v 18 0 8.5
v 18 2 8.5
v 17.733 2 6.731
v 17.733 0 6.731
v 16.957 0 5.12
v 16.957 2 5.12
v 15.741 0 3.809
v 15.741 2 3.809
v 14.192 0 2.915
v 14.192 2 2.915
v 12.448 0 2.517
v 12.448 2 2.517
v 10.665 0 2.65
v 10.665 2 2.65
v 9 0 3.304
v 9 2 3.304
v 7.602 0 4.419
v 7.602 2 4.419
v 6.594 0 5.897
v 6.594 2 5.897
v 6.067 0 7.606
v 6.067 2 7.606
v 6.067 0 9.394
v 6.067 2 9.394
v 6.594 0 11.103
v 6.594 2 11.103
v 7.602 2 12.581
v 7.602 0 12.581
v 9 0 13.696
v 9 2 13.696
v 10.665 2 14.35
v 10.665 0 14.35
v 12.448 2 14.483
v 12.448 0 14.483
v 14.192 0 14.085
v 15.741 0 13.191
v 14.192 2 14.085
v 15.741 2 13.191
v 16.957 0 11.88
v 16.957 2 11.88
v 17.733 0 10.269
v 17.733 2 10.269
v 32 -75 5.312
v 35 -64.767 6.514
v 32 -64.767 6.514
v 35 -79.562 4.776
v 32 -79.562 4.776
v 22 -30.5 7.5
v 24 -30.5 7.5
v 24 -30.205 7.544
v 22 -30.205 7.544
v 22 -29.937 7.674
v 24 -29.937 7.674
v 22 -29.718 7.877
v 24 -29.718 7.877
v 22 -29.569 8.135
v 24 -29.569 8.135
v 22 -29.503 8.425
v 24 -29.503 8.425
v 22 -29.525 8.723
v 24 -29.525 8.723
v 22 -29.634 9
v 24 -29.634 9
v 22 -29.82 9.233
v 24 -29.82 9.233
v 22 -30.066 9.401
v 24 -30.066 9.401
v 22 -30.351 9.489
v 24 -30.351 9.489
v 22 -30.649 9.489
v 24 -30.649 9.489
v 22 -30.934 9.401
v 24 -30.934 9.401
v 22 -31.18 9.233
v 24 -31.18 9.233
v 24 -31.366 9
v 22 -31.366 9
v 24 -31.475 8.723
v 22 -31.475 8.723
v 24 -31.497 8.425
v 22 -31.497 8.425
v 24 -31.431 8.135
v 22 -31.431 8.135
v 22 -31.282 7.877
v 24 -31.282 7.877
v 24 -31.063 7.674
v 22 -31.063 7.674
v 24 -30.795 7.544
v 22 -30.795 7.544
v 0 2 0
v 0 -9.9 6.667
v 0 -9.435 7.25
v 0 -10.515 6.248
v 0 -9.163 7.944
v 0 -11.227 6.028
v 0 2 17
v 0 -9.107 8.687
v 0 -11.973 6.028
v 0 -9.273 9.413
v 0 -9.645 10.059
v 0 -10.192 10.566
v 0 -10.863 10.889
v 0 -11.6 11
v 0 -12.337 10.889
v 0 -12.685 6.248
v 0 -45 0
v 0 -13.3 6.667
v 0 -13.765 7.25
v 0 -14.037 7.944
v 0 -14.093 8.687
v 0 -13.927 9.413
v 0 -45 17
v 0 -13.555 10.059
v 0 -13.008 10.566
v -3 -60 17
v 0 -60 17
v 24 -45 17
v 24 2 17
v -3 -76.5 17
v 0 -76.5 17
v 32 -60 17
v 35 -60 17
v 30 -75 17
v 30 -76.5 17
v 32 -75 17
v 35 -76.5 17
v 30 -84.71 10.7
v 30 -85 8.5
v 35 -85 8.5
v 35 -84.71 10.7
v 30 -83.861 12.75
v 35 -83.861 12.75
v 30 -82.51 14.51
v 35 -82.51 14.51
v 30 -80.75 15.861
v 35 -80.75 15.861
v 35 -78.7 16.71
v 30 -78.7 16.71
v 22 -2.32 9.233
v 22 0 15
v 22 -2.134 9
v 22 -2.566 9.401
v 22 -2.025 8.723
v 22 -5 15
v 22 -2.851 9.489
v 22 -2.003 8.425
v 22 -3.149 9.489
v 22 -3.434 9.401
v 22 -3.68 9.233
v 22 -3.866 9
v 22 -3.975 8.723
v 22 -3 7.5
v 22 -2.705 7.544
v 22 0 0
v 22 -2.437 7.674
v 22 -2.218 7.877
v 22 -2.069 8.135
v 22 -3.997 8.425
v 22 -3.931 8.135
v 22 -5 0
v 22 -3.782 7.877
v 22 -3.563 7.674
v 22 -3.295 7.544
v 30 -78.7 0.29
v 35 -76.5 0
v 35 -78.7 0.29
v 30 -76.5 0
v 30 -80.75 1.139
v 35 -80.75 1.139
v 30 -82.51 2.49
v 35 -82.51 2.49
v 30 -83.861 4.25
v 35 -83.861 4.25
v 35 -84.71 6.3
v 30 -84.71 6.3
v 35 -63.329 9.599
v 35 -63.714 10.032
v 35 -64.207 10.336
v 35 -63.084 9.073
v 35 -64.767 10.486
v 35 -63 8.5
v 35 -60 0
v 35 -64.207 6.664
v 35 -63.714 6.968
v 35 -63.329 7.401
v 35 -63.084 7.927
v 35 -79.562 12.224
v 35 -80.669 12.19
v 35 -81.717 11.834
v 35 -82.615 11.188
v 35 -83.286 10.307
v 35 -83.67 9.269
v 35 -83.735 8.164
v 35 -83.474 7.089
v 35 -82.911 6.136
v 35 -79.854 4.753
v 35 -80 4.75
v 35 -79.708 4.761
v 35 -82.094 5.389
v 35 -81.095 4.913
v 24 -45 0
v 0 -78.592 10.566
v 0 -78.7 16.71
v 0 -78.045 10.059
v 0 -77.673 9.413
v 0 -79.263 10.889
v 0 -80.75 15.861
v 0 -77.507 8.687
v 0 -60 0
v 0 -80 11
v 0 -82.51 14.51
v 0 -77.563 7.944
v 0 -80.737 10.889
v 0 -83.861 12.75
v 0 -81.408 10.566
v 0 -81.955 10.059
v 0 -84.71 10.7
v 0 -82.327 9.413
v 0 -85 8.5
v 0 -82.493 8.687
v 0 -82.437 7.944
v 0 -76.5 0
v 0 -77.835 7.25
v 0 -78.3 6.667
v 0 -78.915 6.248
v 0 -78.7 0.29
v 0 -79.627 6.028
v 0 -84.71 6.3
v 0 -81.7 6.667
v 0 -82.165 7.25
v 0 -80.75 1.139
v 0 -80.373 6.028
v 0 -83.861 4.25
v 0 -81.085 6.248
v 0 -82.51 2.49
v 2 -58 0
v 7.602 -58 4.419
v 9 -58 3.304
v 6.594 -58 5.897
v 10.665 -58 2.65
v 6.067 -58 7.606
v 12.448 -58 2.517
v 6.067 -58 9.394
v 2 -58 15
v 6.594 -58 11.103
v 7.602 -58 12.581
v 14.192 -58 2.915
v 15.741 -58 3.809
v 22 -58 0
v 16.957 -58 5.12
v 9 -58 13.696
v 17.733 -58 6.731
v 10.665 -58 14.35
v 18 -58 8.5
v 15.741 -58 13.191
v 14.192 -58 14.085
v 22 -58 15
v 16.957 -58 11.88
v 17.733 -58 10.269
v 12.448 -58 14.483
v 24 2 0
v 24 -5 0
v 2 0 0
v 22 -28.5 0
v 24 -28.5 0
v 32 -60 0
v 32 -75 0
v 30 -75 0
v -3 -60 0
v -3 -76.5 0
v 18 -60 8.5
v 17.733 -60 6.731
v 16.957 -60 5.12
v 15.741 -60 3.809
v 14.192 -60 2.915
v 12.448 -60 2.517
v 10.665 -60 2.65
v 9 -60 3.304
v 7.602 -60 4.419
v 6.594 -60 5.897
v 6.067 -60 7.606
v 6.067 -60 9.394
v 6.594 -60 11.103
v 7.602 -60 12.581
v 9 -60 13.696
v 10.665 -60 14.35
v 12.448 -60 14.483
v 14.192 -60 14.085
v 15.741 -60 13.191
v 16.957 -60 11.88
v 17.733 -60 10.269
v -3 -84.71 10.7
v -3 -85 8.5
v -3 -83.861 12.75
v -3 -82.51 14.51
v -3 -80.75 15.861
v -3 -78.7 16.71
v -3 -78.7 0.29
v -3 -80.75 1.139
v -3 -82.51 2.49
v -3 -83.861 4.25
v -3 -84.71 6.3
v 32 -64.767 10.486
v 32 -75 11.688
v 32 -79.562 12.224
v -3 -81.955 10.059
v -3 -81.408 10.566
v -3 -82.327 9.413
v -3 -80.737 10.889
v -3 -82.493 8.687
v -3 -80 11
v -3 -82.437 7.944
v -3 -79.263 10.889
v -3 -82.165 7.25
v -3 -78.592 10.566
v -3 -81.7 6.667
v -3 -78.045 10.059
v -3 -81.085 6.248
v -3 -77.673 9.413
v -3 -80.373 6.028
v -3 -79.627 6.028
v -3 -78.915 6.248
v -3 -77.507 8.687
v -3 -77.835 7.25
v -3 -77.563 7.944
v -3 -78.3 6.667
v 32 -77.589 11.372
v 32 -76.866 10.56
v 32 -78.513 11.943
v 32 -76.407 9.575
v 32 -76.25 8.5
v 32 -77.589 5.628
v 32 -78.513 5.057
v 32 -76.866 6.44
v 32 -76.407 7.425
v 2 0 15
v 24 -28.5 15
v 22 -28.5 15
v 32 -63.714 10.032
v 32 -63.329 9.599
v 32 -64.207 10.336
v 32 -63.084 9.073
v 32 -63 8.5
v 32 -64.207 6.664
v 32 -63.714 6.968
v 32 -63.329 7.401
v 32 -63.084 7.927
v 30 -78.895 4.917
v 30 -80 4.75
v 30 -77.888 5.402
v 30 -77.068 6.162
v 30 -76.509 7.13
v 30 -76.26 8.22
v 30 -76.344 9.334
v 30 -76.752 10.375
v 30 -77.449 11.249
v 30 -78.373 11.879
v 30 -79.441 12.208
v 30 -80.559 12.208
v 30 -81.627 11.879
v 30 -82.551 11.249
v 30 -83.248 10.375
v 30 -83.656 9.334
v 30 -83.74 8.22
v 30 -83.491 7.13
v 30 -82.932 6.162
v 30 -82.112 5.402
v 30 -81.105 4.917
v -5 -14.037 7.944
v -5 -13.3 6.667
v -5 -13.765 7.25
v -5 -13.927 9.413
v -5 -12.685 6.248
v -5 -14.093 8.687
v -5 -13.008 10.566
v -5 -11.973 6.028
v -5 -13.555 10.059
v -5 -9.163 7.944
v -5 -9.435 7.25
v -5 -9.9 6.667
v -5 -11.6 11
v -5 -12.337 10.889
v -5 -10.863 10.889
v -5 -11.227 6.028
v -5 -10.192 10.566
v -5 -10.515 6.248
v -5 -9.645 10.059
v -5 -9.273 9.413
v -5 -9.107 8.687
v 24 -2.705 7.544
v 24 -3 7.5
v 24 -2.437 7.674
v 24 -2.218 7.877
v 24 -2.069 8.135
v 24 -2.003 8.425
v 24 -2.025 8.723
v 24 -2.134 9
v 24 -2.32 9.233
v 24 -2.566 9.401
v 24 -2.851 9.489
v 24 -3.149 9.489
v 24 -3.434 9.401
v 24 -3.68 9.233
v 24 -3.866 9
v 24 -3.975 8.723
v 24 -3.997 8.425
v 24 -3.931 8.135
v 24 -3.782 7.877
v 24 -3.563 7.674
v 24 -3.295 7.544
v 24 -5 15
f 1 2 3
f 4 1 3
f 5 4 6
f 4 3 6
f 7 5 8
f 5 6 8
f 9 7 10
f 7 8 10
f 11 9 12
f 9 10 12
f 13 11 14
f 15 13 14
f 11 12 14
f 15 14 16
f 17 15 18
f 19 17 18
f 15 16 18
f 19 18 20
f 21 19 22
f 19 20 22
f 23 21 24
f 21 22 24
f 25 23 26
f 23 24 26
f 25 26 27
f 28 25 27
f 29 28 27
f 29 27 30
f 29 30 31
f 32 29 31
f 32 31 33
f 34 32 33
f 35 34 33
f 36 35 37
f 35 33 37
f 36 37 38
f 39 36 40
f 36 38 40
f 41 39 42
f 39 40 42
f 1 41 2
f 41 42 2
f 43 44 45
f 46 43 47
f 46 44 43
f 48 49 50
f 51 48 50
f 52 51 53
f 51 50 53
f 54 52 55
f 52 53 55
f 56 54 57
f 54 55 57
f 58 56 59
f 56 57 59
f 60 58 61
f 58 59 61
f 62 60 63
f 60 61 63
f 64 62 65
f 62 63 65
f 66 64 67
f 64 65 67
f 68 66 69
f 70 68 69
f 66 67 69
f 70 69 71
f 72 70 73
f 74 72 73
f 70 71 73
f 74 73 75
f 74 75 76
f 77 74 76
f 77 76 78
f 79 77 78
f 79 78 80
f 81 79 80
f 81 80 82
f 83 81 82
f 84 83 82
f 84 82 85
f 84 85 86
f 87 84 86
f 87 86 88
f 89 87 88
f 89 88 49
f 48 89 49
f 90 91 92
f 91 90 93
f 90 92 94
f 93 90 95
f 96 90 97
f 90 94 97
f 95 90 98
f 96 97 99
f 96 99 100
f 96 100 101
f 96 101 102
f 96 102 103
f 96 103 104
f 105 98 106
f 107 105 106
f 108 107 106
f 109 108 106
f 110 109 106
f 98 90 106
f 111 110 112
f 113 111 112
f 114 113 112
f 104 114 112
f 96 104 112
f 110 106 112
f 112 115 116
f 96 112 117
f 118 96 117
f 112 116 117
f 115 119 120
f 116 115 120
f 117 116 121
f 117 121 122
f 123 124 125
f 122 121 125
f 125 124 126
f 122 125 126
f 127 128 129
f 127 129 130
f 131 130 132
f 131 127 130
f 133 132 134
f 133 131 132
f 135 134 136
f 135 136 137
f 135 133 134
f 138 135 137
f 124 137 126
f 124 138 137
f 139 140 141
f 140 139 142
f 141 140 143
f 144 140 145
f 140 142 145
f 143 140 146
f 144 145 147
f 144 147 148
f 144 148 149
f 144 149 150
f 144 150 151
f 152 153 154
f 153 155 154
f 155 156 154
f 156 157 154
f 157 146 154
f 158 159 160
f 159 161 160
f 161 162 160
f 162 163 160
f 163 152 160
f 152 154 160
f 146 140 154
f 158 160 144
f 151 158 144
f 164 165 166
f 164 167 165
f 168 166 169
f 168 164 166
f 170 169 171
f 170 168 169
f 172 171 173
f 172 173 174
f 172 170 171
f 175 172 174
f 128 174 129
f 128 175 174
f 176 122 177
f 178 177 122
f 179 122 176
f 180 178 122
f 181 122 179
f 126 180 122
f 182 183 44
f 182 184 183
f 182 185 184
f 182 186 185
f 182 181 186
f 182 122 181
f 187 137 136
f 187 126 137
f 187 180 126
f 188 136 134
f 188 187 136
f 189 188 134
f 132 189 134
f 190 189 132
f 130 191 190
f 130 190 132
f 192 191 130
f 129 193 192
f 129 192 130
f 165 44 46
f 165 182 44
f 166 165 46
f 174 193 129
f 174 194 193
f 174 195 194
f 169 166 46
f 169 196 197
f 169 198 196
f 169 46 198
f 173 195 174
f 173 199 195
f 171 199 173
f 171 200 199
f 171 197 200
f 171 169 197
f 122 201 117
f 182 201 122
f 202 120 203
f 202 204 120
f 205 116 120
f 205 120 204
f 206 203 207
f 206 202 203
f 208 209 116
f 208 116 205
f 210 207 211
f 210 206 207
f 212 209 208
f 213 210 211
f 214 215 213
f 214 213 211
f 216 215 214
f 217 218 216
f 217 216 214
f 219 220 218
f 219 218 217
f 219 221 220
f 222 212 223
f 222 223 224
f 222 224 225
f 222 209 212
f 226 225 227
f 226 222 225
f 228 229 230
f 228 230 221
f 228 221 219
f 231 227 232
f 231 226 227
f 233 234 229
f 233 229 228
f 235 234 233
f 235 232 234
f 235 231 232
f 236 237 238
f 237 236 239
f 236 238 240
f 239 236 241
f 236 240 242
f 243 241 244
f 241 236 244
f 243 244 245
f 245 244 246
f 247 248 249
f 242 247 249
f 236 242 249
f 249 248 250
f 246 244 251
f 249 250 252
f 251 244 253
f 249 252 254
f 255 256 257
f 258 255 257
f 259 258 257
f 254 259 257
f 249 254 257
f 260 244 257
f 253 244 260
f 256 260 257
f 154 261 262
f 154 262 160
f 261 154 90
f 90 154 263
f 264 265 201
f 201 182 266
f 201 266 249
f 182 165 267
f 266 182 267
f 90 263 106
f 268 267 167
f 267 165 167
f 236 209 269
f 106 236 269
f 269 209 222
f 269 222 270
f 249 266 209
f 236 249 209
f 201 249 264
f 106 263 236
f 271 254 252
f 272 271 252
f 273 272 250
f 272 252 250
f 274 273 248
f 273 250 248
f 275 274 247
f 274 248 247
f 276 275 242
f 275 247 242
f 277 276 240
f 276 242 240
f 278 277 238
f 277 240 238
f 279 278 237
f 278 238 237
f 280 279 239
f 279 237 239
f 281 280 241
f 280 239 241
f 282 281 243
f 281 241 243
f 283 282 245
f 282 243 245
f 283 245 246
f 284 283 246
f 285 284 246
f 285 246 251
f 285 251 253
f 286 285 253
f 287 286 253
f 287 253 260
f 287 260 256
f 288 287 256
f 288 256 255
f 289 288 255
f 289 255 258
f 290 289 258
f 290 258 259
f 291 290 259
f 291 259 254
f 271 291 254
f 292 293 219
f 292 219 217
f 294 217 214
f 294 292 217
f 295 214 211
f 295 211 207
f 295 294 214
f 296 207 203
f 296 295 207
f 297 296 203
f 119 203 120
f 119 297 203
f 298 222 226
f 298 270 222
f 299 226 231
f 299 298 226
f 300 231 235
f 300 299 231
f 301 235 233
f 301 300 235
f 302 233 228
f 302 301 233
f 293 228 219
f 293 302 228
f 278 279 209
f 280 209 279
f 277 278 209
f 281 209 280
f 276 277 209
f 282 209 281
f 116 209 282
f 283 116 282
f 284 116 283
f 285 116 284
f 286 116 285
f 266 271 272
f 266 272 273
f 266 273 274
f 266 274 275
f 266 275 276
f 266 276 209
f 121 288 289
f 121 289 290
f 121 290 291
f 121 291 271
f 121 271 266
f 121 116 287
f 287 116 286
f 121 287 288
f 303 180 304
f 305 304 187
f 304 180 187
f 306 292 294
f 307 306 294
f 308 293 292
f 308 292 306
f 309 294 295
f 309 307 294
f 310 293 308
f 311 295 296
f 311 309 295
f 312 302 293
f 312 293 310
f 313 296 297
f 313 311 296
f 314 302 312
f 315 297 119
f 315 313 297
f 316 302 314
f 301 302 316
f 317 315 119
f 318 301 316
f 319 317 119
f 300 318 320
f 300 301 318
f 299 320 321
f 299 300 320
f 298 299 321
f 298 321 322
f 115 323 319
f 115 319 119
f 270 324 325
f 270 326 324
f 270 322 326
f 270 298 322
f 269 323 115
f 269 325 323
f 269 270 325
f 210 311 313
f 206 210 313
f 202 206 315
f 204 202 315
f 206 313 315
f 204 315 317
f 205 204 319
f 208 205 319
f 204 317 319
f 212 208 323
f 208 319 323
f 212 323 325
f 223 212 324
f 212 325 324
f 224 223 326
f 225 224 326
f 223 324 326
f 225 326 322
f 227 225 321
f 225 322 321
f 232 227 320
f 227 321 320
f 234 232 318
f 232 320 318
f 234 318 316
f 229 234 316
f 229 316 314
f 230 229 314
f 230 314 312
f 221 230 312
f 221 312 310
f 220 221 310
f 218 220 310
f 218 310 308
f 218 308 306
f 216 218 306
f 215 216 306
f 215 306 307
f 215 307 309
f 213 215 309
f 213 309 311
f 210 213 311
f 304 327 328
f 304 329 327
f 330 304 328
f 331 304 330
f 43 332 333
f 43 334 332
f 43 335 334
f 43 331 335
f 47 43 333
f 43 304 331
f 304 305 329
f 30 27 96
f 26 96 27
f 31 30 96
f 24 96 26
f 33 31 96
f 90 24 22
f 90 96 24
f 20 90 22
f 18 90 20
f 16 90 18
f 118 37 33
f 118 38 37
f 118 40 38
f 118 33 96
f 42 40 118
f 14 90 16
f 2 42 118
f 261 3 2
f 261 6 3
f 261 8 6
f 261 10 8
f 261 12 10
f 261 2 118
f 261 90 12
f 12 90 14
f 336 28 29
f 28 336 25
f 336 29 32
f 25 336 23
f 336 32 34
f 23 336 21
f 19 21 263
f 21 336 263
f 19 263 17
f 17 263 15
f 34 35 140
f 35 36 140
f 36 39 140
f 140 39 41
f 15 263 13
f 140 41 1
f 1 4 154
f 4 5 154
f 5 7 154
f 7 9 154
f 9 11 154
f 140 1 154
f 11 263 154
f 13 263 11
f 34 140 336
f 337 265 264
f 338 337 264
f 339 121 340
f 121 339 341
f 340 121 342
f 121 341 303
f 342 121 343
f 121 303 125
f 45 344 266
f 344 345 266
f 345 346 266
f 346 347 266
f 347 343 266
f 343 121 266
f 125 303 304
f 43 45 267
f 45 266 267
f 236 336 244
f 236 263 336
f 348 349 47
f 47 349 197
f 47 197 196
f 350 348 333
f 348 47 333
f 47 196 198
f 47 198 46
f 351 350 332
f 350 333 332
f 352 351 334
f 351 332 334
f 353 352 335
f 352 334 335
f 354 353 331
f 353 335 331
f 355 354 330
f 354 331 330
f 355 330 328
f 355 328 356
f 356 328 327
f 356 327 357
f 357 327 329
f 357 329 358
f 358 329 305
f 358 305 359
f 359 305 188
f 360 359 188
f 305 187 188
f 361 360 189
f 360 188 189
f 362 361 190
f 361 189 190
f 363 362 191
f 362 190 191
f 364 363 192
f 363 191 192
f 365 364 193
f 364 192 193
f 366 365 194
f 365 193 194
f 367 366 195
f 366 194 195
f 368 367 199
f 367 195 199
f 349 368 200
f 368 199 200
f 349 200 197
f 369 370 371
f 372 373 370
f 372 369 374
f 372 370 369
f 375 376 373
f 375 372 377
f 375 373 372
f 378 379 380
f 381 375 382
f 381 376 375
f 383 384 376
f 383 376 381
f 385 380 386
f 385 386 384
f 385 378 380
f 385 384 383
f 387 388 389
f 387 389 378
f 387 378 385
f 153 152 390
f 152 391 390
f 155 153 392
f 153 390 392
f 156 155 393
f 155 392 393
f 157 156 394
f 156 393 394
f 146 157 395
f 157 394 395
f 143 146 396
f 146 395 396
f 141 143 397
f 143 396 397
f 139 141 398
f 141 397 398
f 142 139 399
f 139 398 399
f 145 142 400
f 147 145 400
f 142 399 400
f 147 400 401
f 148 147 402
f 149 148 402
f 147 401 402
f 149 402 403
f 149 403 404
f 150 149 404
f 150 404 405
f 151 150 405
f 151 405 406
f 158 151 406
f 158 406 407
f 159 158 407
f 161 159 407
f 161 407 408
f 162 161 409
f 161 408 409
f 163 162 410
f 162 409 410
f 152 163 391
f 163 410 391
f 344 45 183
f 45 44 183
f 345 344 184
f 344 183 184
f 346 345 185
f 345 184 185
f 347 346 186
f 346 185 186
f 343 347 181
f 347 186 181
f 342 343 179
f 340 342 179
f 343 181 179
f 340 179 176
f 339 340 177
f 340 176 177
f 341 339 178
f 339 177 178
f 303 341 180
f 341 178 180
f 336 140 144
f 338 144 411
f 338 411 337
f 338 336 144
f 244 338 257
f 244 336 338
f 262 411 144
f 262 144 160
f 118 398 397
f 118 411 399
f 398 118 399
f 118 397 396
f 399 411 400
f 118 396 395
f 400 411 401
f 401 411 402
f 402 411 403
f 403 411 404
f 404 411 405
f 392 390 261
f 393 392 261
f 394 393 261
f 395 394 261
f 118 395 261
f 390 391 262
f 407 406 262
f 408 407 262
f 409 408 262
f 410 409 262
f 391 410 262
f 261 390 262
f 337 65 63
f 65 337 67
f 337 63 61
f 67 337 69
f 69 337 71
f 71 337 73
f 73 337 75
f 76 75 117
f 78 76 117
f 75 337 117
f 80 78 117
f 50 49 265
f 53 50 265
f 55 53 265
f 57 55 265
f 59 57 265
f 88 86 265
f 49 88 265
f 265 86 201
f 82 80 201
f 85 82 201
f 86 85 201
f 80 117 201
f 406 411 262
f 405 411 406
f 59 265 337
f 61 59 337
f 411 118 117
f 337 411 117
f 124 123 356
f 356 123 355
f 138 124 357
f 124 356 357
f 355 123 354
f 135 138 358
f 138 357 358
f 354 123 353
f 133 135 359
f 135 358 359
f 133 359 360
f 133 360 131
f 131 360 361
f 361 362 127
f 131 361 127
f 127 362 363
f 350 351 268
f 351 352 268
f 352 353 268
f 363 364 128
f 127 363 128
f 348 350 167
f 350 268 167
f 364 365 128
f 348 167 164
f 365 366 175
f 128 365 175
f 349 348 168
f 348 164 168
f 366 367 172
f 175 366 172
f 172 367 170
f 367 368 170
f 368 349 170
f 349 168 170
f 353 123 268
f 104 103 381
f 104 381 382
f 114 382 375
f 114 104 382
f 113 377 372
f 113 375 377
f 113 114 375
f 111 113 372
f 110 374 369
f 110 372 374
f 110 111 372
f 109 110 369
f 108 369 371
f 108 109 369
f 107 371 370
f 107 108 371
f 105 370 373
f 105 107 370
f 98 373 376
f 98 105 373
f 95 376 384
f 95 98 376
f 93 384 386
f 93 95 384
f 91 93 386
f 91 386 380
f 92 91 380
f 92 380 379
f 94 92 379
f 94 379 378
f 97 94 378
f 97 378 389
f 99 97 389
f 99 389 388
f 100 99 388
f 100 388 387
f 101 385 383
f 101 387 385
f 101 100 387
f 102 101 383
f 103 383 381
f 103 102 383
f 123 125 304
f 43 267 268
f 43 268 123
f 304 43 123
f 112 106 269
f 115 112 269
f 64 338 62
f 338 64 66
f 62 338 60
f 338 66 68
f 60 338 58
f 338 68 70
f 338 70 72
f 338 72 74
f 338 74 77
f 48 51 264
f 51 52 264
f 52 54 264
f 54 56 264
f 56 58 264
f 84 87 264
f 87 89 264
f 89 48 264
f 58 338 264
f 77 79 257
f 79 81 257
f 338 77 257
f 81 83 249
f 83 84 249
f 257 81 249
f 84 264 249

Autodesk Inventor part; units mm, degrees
ref_plane "YZ Plane" through (0, 0, 0) normal (1, 0, 0) x (0, 1, 0)
ref_plane "XZ Plane" through (0, 0, 0) normal (0, 1, 0) x (-1, 0, 0)
ref_plane "XY Plane" through (0, 0, 0) normal (0, 0, 1) x (1, 0, 0)
sketch "Sketch1" plane through (0, 0, 0) normal (0, 0, 1) x (1, 0, 0)
  line L0 (0, 0) -> (24, 0)
  line L1 (24, 0) -> (24, -60)
  line L2 (24, -60) -> (0, -60)
  line L3 (0, -60) -> (0, 0)
  dimension "d0" = 24
  dimension "d1" = 60
extrude "Extrusion1" add sketch "Sketch1" along normal blind 2
sketch "Sketch2" plane through (0, 0, 2) normal (0, 0, 1) x (1, 0, 0)
  line L0 (0, -60) -> (24, -60) projected
  line L1 (0, 0) -> (2, 0)
  line L2 (2, 0) -> (2, -60)
  line L3 (2, -60) -> (0, -60)
  line L4 (0, -60) -> (0, 0)
  line L5 (24, -60) -> (24, 0) projected
  line L6 (24, 0) -> (22, 0)
  line L7 (22, 0) -> (22, -60)
  line L8 (22, -60) -> (24, -60)
  line L9 (24, -60) -> (24, 0)
  dimension "d4" = 2
  dimension "d5" = 2
extrude "Extrusion2" add sketch "Sketch2" along normal blind 15
sketch "Sketch3" plane through (24, -60, 0) normal (1, 0, 0) x (0, 0, -1)
  circle A0 centre (-8.5, 57) radius 1
  circle A1 centre (-8.5, 29.5) radius 1
  line L0 (-17, 0) -> (-17, 60) projected
  line L1 (0, 60) -> (-17, 60) projected
  dimension "d8" = 2
  dimension "d9" = 2
  dimension "d10" = 8.5
  dimension "d11" = 8.5
  dimension "d12" = 27.5
  dimension "d13" = 3
extrude "Extrusion3" cut sketch "Sketch3" against normal up to surface (2 mm away)
sketch "Sketch4" plane through (24, -60, 0) normal (1, 0, 0) x (0, 0, -1)
  line L0 (-17, 60) -> (-17, 0) projected
  line L1 (-17, 55) -> (-2, 55)
  line L2 (-2, 55) -> (-2, 31.5)
  line L3 (-2, 31.5) -> (-17, 31.5)
  line L4 (-17, 31.5) -> (-17, 55)
  circle A0 centre (-8.5, 57) radius 1 projected
  circle A1 centre (-8.5, 29.5) radius 1 projected
  point P0 (-17, 31.5)
  dimension "d23" = 15
  dimension "d24" = 23.5
  dimension "d25" = 2
  dimension "d26" = 2
extrude "Extrusion4" cut sketch "Sketch4" against normal up to surface (2 mm away) contours L1 L2 L3 L0
sketch "Sketch5" plane through (0, -60, 0) normal (-1, 0, 0) x (0, 0, 1)
  circle A0 centre (8.5, 48.4) radius 2.5
  circle A1 centre (8.5, 57) radius 1 projected
  point P0 (0, 60)
  dimension "d29" = 5
  dimension "d32" = 8.6
  dimension "d33" = 0
extrude "Extrusion5" add sketch "Sketch5" along normal blind 5 contours A0
sketch "Sketch12" plane through (0, 0, 0) normal (0, 0, -1) x (-1, 0, 0)
  line L0 (3, -60) -> (-35, -60)
  line L1 (-35, -60) -> (-35, -85)
  line L2 (-35, -85) -> (3, -85)
  line L3 (3, -85) -> (3, -60)
  line L4 (0, 0) -> (0, -60) projected
  line L5 (-2, -60) -> (-22, -60) projected
  line L6 (3, -60) -> (0, -60)
  line L7 (0, -60) -> (0, -85)
  line L8 (0, -85) -> (3, -85)
  line L9 (3, -85) -> (3, -60)
  line L10 (-35, -60) -> (-30, -60)
  line L11 (-30, -60) -> (-30, -85)
  line L12 (-30, -85) -> (-35, -85)
  line L13 (-35, -85) -> (-35, -60)
  line L14 (-30, -60) -> (-32, -60)
  line L15 (-32, -60) -> (-32, -75)
  line L16 (-32, -75) -> (-30, -75)
  line L17 (-30, -75) -> (-30, -60)
  dimension "d51" = 38
  dimension "d52" = 3
  dimension "d53" = 25
  dimension "d54" = 0
  dimension "d55" = 3
  dimension "d56" = 5
  dimension "d95" = 2
  dimension "d96" = 15
extrude "Extrusion9" add sketch "Sketch12" against normal up to surface (17 mm away) contours L3 L2 L7 L0 | L2 L1 L0 L15 L16 L11
sketch "Sketch13" plane through (0, 0, 0) normal (0, 0, -1) x (-1, 0, 0)
  line L0 (-32, -60) -> (-35, -60) projected
  line L1 (0, -60) -> (-24, -60) projected
  line L2 (-35, -60) -> (-24, -60)
  line L3 (-24, -60) -> (-24, -45)
  line L4 (-24, -45) -> (-35, -60)
  line L5 (0, -60) -> (0, -45)
  line L6 (0, 0) -> (0, -60) projected
  line L7 (0, -60) -> (15, -60) construction
  line L8 (0, -45) -> (3, -60)
  line L9 (3, -60) -> (0, -60)
  point P0 (-30, -60)
  dimension "d59" = 15
  dimension "d60" = 90
  dimension "d63" = 15
  dimension "d64" = 90
extrude "Extrusion10" add sketch "Sketch13" against normal up to surface (17 mm away)
sketch "Sketch14" plane through (-3, -85, 0) normal (-1, 0, 0) x (0, 0, 1)
  circle A0 centre (8.5, 5) radius 2.5
  line L0 (17, 0) -> (17, 25) projected
  line L1 (0, 25) -> (17, 25) projected
  point P0 (0, 85)
  dimension "d65" = 5
  dimension "d66" = 8.5
  dimension "d67" = 20
extrude "Extrusion11" cut sketch "Sketch14" against normal up to surface (38 mm away)
sketch "Sketch15" plane through (2, -60, 2) normal (1, 0, 0) x (0, 0, -1)
  line L0 (2, 0) -> (-15, 0) projected
  line L1 (-15, 60) -> (-13, 60)
  line L2 (-13, 60) -> (-13, 0)
  line L3 (-13, 0) -> (-15, 0)
  line L4 (-15, 0) -> (-15, 60)
  point P0 (2, 60)
  dimension "d70" = 2
extrude "Extrusion12" add sketch "Sketch15" along normal up to surface (22 mm away)
sketch "Sketch16" plane through (0, 0, 0) normal (0, 0, -1) x (-1, 0, 0)
  line L0 (-2, 0) -> (-2, -60) projected
  line L1 (-2, -60) -> (-22, -60) projected
  line L2 (-2, 0) -> (-22, 0)
  line L3 (-22, 0) -> (-22, -60)
  line L4 (-22, -60) -> (-2, -60)
  line L5 (-2, -60) -> (-2, 0)
  line L6 (-24, -45) -> (-24, 0) projected
  line L7 (-24, -28.5) -> (-22, -28.5) projected
  line L8 (-24, -5) -> (-22, -5)
  line L9 (-22, -5) -> (-22, -28.5)
  line L10 (-22, -28.5) -> (-24, -28.5)
  line L11 (-24, -28.5) -> (-24, -5)
  point P0 (0, 0)
extrude "Extrusion14" cut sketch "Sketch16" against normal up to surface (2 mm away)
sketch "Sketch17" plane through (22, -60, 0) normal (0, -1, 0) x (1, 0, 0)
  line L0 (-20, 2) -> (-20, 15) projected
  line L1 (-20, 15) -> (0, 15) projected
  line L2 (-20, 0) -> (0, 0)
  line L3 (0, 0) -> (0, 15)
  line L4 (0, 15) -> (-20, 15)
  line L5 (-20, 15) -> (-20, 0)
  point P0 (-22, 0)
  point P1 (-20, 2)
extrude "Extrusion15" add sketch "Sketch17" against normal blind 2
sketch "Sketch18" plane through (0, 0, 0) normal (0, 1, 0) x (1, 0, 0)
  line L0 (0, 0) -> (0, -17) projected
  line L1 (24, -17) -> (24, 0) projected
  line L2 (0, -17) -> (24, -17)
  line L3 (24, -17) -> (24, 0)
  line L4 (24, 0) -> (0, 0)
  line L5 (0, 0) -> (0, -17)
extrude "Extrusion16" add sketch "Sketch18" along normal blind 2
sketch "Sketch19" plane through (0, 2, 0) normal (0, 1, 0) x (1, 0, 0)
  circle A0 centre (12, -8.5) radius 6
  line L0 (0, 0) -> (0, -17) projected
  line L1 (0, -17) -> (24, -17) projected
  dimension "d81" = 12
  dimension "d82" = 12
  dimension "d83" = 8.5
extrude "Extrusion17" cut sketch "Sketch19" against normal up to surface (62 mm away)
sketch "Sketch20" plane through (35, -85, 17) normal (1, 0, 0) x (0, 0, -1)
  circle A0 centre (8.5, 5) radius 2.5 projected
  circle A1 centre (8.5, 5) radius 3.75
  point P0 (17, 85)
  dimension "d86" = 7.5
extrude "Extrusion18" cut sketch "Sketch20" against normal up to surface (5 mm away)
fillet "Fillet2" radius 8.5 4 edges at (-1.5, -85, 0) (-1.5, -85, 17) (32.5, -85, 0) (32.5, -85, 17)
sketch "Sketch21" plane through (35, -60, 17) normal (1, 0, 0) x (0, 0, -1)
  circle A0 centre (8.5, -20) radius 3.75 projected
  circle A1 centre (8.5, -20) radius 3.75
  circle A2 centre (8.5, -5) radius 2
  circle A3 centre (8.5, -20) radius 3.75
  line L0 (10.4863, -4.7667) -> (12.2244, -19.5625)
  line L1 (6.5137, -4.7667) -> (4.7756, -19.5625)
  point P0 (17, 60)
  point P1 (4.7756, -19.5625)
  point P2 (12.2244, -19.5625)
  dimension "d90" = 4
  dimension "d91" = 15
  dimension "d92" = 0
extrude "Extrusion19" cut sketch "Sketch21" against normal blind 3
properties part number "juncao5"
